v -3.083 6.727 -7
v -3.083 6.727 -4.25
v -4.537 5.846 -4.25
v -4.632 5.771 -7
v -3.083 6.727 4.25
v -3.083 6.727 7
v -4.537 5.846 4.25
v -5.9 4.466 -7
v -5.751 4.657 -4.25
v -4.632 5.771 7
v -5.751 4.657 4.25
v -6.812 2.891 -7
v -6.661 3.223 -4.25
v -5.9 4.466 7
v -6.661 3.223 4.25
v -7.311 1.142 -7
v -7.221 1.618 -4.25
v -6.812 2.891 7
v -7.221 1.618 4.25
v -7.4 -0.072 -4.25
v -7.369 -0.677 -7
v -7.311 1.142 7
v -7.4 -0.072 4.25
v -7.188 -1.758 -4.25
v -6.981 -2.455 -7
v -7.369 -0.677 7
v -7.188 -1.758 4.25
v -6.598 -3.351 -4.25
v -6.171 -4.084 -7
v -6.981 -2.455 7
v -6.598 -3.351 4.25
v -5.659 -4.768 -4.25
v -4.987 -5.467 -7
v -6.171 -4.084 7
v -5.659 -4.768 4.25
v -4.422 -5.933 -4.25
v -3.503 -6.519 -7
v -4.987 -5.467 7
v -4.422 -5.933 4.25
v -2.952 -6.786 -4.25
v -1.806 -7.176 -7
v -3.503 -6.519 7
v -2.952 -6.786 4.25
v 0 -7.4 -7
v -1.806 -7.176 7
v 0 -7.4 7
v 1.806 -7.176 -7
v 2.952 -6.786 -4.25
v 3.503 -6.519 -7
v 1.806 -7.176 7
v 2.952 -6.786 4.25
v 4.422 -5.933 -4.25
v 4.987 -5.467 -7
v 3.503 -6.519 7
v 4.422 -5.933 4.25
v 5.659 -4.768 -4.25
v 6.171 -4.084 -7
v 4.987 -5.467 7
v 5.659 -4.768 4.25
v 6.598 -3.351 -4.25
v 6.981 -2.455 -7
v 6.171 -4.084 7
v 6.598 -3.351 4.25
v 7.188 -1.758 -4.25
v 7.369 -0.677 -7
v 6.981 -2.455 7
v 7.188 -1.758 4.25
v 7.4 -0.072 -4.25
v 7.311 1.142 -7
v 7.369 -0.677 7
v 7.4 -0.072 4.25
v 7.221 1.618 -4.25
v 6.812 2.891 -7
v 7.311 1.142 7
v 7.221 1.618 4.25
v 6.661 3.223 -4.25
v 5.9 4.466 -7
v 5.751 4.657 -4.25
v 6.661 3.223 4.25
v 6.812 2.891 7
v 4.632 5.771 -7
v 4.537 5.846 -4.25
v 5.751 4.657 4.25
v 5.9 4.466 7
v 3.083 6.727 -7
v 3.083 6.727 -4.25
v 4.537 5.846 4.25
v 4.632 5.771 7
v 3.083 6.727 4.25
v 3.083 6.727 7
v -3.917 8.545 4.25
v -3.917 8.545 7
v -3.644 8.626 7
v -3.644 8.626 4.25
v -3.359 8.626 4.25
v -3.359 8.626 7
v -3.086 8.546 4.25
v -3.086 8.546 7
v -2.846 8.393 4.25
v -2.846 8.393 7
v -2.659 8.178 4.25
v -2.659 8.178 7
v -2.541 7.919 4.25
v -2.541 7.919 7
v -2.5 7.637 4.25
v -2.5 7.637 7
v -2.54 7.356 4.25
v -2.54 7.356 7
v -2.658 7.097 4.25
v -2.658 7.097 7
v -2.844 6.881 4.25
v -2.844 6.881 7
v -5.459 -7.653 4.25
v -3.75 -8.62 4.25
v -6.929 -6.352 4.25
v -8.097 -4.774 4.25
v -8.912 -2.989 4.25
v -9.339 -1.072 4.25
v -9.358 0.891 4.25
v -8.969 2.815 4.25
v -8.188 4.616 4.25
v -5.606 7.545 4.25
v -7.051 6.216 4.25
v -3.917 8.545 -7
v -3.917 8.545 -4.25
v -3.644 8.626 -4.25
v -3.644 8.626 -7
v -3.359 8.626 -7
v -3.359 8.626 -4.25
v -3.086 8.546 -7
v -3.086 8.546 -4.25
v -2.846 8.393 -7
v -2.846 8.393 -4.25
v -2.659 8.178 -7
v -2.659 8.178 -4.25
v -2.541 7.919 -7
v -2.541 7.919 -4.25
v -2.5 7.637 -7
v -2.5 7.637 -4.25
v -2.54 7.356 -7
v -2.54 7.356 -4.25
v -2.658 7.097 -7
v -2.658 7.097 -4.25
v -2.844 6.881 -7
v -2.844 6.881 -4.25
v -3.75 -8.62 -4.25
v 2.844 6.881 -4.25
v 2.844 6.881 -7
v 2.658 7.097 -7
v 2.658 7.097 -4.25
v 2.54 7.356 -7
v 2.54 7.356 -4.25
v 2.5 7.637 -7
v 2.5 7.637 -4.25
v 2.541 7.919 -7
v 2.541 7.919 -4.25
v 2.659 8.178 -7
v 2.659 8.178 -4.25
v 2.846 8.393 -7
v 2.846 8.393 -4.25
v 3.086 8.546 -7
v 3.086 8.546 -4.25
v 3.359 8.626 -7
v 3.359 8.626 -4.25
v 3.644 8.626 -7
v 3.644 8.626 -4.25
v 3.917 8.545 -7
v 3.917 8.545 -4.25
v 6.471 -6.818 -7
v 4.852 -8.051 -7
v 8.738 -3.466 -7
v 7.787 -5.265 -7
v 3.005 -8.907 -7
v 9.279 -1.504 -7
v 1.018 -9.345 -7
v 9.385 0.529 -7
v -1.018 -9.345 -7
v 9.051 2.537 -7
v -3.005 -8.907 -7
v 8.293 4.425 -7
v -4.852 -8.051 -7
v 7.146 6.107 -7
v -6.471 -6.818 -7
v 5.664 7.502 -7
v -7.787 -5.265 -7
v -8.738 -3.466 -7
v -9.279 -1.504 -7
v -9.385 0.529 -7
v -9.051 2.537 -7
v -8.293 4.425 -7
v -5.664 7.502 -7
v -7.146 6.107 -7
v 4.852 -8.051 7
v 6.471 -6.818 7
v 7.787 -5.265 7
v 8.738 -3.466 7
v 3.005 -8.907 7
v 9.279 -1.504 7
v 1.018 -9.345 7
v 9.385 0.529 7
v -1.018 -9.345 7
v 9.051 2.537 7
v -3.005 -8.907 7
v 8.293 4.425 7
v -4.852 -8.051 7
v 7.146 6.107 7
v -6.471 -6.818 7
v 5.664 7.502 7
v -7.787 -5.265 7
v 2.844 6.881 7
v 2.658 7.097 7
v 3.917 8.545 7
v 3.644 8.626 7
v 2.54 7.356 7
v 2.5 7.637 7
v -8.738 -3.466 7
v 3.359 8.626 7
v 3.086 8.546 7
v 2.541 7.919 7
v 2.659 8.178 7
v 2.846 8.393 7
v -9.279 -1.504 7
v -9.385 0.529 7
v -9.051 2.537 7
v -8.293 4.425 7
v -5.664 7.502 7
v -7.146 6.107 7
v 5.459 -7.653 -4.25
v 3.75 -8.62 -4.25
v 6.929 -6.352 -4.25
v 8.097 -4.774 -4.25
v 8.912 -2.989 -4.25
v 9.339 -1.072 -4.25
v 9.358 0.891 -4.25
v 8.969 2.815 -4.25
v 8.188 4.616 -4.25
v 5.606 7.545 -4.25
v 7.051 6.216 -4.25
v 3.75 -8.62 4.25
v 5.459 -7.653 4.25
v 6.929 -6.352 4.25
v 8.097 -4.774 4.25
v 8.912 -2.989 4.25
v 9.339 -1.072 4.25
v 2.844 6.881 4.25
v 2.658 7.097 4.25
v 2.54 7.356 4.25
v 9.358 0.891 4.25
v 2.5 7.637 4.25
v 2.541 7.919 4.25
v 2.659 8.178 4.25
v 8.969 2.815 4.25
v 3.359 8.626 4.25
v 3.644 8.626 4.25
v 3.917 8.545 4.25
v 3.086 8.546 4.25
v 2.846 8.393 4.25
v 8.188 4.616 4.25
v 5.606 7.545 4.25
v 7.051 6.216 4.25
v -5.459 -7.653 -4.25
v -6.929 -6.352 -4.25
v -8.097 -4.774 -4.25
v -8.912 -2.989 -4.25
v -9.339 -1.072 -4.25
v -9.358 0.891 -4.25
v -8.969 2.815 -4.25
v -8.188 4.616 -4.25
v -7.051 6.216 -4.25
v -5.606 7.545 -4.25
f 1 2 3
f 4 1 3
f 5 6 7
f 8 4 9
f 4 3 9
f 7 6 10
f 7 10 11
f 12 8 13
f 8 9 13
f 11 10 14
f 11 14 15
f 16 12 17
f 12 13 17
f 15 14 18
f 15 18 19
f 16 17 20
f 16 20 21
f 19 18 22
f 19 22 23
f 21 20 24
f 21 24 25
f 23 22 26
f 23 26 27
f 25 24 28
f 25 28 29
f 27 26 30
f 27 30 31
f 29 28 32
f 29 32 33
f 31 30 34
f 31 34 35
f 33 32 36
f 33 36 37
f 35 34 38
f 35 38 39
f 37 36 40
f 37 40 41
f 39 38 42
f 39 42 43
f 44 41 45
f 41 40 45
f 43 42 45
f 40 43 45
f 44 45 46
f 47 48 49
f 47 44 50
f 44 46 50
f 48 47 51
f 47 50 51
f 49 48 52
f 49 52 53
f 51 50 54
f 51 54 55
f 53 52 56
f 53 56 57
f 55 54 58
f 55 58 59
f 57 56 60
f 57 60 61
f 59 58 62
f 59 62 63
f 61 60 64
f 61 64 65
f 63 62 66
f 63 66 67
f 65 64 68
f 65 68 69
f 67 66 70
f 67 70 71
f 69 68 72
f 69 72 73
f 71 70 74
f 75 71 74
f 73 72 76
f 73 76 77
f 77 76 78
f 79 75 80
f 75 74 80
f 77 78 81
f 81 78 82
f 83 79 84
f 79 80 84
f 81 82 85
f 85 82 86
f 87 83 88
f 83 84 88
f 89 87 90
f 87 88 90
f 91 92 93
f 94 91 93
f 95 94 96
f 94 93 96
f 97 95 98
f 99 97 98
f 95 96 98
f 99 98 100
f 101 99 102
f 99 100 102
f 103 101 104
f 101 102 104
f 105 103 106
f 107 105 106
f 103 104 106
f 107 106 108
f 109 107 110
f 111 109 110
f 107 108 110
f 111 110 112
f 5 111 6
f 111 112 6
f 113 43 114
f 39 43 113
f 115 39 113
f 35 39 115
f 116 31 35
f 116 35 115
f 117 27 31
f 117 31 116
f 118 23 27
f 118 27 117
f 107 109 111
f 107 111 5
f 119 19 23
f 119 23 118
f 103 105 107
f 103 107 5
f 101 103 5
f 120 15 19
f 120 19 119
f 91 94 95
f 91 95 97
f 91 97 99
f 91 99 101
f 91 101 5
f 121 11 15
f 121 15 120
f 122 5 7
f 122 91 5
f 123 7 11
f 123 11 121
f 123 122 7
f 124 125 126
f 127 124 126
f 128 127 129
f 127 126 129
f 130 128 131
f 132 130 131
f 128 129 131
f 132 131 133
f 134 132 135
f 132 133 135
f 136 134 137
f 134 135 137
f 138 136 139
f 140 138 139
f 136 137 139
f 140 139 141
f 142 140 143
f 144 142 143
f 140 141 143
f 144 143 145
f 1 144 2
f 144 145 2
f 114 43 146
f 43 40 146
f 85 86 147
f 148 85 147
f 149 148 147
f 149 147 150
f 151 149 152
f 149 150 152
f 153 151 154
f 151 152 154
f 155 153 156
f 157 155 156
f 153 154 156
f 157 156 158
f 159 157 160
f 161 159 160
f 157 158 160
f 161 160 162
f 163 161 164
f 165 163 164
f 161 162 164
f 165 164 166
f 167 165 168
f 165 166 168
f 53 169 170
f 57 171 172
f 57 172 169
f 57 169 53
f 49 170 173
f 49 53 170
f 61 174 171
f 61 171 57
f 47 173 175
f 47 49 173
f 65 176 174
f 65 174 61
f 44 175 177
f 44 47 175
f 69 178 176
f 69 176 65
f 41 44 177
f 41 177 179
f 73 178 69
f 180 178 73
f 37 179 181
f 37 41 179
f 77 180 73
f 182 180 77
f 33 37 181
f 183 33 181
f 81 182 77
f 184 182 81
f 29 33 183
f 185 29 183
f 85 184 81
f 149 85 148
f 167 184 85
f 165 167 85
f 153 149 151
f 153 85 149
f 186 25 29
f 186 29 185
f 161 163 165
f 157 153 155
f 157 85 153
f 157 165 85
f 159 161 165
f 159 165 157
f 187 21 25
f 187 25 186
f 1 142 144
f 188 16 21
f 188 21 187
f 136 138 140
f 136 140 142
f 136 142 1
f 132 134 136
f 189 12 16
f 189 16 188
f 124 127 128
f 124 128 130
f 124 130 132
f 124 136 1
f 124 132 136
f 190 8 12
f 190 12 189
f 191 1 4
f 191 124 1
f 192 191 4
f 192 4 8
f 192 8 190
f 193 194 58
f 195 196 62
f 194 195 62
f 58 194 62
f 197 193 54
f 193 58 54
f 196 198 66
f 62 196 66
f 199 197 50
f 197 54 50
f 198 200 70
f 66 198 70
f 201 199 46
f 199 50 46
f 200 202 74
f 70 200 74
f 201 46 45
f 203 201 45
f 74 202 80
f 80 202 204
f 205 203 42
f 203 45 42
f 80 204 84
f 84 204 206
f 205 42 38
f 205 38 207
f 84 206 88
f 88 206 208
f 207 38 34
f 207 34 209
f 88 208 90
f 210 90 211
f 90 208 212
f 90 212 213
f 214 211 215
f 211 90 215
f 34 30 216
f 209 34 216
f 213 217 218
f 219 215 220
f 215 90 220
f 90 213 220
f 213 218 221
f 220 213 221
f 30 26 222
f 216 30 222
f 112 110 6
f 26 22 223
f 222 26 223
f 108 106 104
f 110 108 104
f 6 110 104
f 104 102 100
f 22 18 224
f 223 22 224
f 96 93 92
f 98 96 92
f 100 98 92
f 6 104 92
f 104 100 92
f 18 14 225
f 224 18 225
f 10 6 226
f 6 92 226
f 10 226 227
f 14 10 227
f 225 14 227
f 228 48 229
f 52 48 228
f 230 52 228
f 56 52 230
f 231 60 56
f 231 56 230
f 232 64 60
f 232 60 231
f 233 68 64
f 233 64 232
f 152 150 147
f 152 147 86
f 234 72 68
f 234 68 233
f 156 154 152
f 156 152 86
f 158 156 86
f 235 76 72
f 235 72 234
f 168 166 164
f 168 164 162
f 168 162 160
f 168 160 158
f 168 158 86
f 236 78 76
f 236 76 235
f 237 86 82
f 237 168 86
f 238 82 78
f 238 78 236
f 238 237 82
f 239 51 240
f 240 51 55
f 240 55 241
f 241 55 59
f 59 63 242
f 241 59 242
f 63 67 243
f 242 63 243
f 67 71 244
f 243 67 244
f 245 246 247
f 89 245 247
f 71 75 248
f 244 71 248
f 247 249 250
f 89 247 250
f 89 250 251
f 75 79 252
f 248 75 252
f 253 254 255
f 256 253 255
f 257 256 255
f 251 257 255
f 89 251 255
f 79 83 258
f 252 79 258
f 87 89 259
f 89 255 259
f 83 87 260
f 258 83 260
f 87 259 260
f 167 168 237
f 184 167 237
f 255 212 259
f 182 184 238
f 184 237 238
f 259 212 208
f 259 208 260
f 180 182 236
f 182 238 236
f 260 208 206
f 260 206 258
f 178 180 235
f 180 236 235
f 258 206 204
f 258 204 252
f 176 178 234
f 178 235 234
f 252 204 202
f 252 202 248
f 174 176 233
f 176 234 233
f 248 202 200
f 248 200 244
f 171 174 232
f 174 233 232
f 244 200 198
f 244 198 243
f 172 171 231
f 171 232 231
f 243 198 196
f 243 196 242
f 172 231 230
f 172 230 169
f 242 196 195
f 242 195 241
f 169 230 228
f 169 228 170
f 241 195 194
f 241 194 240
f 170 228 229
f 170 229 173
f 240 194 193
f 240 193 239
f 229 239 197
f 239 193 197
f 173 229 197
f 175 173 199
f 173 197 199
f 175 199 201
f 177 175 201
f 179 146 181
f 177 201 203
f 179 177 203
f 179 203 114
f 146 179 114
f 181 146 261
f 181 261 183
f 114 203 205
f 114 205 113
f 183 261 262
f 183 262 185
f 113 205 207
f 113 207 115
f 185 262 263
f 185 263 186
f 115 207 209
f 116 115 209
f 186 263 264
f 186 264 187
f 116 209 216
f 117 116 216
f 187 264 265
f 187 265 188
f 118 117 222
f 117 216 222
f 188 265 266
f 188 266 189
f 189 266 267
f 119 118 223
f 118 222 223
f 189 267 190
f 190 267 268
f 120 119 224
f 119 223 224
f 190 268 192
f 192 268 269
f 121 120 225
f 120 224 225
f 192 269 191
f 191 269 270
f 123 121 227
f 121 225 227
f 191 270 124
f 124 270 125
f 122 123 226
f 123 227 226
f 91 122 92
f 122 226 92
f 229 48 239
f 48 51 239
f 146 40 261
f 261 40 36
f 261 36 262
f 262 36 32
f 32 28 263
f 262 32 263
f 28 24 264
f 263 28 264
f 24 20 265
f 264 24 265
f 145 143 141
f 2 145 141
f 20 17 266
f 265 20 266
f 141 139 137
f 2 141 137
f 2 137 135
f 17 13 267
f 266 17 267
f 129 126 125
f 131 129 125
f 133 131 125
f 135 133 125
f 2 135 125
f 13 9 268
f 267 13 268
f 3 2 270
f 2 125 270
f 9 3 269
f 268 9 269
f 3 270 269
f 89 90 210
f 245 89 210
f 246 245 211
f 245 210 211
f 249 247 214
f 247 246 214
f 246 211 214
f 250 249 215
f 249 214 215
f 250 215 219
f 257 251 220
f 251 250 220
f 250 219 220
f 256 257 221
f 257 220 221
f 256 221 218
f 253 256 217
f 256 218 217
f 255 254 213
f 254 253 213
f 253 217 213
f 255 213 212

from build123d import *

# Parameters (mm, degrees)
EXTRUDE_1_DEPTH     = 7
CUT_EXTRUDE_1_DEPTH = 4.25


with BuildPart() as part:
    # 草图1 → 凸台-拉伸1 (new body, symmetric)
    with BuildSketch(Plane.XY):
        with BuildLine():
            ThreePointArc((-3.083333333, 6.727039137), (0, -7.4), (3.083333333, 6.727039137))
            ThreePointArc((3.083333333, 6.727039137), (2.590940657, 8.052765147), (3.916666667, 8.545157823))
            ThreePointArc((3.916666667, 8.545157823), (0, -9.4), (-3.916666667, 8.545157823))
            ThreePointArc((-3.916666667, 8.545157823), (-2.590940657, 8.052765147), (-3.083333333, 6.727039137))
        make_face()
    extrude(amount=EXTRUDE_1_DEPTH, both=True)

    # 草图2 → 切除-拉伸1 (cut, symmetric)
    with BuildSketch(Plane.XY):
        with BuildLine():
            Line((-2.95212766, -6.785642363), (-3.75, -8.619599759))
            ThreePointArc((-3.75, -8.619599759), (-9.399556913, -0.091267984), (-3.916666667, 8.545157823))
            ThreePointArc((-3.916666667, 8.545157823), (-2.590940657, 8.052765147), (-3.083333333, 6.727039137))
            ThreePointArc((-3.083333333, 6.727039137), (-7.399651187, -0.071849264), (-2.95212766, -6.785642363))
        make_face()
        with BuildLine():
            Line((2.95212766, -6.785642363), (3.75, -8.619599759))
            ThreePointArc((3.75, -8.619599759), (9.399556913, -0.091267984), (3.916666667, 8.545157823))
            ThreePointArc((3.916666667, 8.545157823), (2.590940657, 8.052765147), (3.083333333, 6.727039137))
            ThreePointArc((3.083333333, 6.727039137), (7.399651187, -0.071849264), (2.95212766, -6.785642363))
        make_face()
    extrude(amount=CUT_EXTRUDE_1_DEPTH, both=True, mode=Mode.SUBTRACT)


solid = part.part
